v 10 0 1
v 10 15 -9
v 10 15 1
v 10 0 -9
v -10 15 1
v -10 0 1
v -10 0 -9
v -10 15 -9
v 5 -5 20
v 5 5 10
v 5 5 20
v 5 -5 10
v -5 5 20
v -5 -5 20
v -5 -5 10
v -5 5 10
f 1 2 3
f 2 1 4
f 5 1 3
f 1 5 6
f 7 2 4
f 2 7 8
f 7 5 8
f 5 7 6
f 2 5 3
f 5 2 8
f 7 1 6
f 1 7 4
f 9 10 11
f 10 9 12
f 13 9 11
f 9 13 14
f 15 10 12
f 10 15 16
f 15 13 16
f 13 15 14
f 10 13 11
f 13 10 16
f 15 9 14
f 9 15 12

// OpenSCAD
// file: w23/utils.scad
// my improved version of the openSCAD cube module
// size works like the first parameter of the cube primitive, it's a 3 dim vector that contains the sidelengths of the "cube" ;)
// center is also a 3 dim vector so you can specify the centering for each axis individually, This is normaly either -0.5, 0 (equal to center = true), or 0.5 (equal to center = false) but any value is possible.
// offset specifies an absolute offset in mm from the position that would result from just the center parameter
module cubeEx(size=[1,1,1], center=[0,0,0], offset=[0,0,0], childCenters, childOffsets, unionNotDifference=0)
{
	//s = 1.5;
	//centerExp = [s*center[0], s*center[1], s*center[2]];

	translate([center[0]*size[0]+offset[0], center[1]*size[1]+offset[1], center[2]*size[2]+offset[2]])
	{
		if (!unionNotDifference)
			difference()
			{
				cube(size, center = true);
				if ($children > 0) for (i = [0:$children-1])
					translate([childCenters[i][0]*size[0]+childOffsets[i][0], childCenters[i][1]*size[1]+childOffsets[i][1], childCenters[i][2]*size[2]+childOffsets[i][2]]) child(i);
			}
		if (unionNotDifference)
			union()
			{
				cube(size, center = true);
				if ($children > 0) for (i = [0:$children-1])
					translate([childCenters[i][0]*size[0]+childOffsets[i][0], childCenters[i][1]*size[1]+childOffsets[i][1], childCenters[i][2]*size[2]+childOffsets[i][2]]) child(i);
			}
	}
}
// main file
use <w23/utils.scad>

// cubeEx Examples
// my improved version of the openSCAD cube module
// size works like the first parameter of the cube primitive, it's a 3 dim vector that contains the sidelengths of the "cube" ;)
// center is also a 3 dim vector so you can specify the centering for each axis individually, This is normaly either -0.5, 0 (equal to center = true), or 0.5 (equal to center = false) but any value is possible.
// offset specifies an absolute offset in mm from the position that would result from just the center parameter

cubeEx([20, 15, 10], // "cube" hase size 20x15x10 
	  [0,           // centered in x axis (0 "==" center=true )
        0.5,         // shifted by half its size in positive y axis (0.5 == center=false)
       -0.5],        // shifted by half its size in negative z axis ( cant be done with center)6
	  [0, 0, 1]);   // offset by -1mm in z axis

cubeEx([10, 10, 10], [0,0,1.5]); // cube is shifted in the z axis by 1.5 its size from origin  
%cubeEx([10, 10, 10], [0,0,.5]); // cube is shifted in the z axis by 0.5 its size from origin so it fits exactly between the x/y plane and the above cube 
